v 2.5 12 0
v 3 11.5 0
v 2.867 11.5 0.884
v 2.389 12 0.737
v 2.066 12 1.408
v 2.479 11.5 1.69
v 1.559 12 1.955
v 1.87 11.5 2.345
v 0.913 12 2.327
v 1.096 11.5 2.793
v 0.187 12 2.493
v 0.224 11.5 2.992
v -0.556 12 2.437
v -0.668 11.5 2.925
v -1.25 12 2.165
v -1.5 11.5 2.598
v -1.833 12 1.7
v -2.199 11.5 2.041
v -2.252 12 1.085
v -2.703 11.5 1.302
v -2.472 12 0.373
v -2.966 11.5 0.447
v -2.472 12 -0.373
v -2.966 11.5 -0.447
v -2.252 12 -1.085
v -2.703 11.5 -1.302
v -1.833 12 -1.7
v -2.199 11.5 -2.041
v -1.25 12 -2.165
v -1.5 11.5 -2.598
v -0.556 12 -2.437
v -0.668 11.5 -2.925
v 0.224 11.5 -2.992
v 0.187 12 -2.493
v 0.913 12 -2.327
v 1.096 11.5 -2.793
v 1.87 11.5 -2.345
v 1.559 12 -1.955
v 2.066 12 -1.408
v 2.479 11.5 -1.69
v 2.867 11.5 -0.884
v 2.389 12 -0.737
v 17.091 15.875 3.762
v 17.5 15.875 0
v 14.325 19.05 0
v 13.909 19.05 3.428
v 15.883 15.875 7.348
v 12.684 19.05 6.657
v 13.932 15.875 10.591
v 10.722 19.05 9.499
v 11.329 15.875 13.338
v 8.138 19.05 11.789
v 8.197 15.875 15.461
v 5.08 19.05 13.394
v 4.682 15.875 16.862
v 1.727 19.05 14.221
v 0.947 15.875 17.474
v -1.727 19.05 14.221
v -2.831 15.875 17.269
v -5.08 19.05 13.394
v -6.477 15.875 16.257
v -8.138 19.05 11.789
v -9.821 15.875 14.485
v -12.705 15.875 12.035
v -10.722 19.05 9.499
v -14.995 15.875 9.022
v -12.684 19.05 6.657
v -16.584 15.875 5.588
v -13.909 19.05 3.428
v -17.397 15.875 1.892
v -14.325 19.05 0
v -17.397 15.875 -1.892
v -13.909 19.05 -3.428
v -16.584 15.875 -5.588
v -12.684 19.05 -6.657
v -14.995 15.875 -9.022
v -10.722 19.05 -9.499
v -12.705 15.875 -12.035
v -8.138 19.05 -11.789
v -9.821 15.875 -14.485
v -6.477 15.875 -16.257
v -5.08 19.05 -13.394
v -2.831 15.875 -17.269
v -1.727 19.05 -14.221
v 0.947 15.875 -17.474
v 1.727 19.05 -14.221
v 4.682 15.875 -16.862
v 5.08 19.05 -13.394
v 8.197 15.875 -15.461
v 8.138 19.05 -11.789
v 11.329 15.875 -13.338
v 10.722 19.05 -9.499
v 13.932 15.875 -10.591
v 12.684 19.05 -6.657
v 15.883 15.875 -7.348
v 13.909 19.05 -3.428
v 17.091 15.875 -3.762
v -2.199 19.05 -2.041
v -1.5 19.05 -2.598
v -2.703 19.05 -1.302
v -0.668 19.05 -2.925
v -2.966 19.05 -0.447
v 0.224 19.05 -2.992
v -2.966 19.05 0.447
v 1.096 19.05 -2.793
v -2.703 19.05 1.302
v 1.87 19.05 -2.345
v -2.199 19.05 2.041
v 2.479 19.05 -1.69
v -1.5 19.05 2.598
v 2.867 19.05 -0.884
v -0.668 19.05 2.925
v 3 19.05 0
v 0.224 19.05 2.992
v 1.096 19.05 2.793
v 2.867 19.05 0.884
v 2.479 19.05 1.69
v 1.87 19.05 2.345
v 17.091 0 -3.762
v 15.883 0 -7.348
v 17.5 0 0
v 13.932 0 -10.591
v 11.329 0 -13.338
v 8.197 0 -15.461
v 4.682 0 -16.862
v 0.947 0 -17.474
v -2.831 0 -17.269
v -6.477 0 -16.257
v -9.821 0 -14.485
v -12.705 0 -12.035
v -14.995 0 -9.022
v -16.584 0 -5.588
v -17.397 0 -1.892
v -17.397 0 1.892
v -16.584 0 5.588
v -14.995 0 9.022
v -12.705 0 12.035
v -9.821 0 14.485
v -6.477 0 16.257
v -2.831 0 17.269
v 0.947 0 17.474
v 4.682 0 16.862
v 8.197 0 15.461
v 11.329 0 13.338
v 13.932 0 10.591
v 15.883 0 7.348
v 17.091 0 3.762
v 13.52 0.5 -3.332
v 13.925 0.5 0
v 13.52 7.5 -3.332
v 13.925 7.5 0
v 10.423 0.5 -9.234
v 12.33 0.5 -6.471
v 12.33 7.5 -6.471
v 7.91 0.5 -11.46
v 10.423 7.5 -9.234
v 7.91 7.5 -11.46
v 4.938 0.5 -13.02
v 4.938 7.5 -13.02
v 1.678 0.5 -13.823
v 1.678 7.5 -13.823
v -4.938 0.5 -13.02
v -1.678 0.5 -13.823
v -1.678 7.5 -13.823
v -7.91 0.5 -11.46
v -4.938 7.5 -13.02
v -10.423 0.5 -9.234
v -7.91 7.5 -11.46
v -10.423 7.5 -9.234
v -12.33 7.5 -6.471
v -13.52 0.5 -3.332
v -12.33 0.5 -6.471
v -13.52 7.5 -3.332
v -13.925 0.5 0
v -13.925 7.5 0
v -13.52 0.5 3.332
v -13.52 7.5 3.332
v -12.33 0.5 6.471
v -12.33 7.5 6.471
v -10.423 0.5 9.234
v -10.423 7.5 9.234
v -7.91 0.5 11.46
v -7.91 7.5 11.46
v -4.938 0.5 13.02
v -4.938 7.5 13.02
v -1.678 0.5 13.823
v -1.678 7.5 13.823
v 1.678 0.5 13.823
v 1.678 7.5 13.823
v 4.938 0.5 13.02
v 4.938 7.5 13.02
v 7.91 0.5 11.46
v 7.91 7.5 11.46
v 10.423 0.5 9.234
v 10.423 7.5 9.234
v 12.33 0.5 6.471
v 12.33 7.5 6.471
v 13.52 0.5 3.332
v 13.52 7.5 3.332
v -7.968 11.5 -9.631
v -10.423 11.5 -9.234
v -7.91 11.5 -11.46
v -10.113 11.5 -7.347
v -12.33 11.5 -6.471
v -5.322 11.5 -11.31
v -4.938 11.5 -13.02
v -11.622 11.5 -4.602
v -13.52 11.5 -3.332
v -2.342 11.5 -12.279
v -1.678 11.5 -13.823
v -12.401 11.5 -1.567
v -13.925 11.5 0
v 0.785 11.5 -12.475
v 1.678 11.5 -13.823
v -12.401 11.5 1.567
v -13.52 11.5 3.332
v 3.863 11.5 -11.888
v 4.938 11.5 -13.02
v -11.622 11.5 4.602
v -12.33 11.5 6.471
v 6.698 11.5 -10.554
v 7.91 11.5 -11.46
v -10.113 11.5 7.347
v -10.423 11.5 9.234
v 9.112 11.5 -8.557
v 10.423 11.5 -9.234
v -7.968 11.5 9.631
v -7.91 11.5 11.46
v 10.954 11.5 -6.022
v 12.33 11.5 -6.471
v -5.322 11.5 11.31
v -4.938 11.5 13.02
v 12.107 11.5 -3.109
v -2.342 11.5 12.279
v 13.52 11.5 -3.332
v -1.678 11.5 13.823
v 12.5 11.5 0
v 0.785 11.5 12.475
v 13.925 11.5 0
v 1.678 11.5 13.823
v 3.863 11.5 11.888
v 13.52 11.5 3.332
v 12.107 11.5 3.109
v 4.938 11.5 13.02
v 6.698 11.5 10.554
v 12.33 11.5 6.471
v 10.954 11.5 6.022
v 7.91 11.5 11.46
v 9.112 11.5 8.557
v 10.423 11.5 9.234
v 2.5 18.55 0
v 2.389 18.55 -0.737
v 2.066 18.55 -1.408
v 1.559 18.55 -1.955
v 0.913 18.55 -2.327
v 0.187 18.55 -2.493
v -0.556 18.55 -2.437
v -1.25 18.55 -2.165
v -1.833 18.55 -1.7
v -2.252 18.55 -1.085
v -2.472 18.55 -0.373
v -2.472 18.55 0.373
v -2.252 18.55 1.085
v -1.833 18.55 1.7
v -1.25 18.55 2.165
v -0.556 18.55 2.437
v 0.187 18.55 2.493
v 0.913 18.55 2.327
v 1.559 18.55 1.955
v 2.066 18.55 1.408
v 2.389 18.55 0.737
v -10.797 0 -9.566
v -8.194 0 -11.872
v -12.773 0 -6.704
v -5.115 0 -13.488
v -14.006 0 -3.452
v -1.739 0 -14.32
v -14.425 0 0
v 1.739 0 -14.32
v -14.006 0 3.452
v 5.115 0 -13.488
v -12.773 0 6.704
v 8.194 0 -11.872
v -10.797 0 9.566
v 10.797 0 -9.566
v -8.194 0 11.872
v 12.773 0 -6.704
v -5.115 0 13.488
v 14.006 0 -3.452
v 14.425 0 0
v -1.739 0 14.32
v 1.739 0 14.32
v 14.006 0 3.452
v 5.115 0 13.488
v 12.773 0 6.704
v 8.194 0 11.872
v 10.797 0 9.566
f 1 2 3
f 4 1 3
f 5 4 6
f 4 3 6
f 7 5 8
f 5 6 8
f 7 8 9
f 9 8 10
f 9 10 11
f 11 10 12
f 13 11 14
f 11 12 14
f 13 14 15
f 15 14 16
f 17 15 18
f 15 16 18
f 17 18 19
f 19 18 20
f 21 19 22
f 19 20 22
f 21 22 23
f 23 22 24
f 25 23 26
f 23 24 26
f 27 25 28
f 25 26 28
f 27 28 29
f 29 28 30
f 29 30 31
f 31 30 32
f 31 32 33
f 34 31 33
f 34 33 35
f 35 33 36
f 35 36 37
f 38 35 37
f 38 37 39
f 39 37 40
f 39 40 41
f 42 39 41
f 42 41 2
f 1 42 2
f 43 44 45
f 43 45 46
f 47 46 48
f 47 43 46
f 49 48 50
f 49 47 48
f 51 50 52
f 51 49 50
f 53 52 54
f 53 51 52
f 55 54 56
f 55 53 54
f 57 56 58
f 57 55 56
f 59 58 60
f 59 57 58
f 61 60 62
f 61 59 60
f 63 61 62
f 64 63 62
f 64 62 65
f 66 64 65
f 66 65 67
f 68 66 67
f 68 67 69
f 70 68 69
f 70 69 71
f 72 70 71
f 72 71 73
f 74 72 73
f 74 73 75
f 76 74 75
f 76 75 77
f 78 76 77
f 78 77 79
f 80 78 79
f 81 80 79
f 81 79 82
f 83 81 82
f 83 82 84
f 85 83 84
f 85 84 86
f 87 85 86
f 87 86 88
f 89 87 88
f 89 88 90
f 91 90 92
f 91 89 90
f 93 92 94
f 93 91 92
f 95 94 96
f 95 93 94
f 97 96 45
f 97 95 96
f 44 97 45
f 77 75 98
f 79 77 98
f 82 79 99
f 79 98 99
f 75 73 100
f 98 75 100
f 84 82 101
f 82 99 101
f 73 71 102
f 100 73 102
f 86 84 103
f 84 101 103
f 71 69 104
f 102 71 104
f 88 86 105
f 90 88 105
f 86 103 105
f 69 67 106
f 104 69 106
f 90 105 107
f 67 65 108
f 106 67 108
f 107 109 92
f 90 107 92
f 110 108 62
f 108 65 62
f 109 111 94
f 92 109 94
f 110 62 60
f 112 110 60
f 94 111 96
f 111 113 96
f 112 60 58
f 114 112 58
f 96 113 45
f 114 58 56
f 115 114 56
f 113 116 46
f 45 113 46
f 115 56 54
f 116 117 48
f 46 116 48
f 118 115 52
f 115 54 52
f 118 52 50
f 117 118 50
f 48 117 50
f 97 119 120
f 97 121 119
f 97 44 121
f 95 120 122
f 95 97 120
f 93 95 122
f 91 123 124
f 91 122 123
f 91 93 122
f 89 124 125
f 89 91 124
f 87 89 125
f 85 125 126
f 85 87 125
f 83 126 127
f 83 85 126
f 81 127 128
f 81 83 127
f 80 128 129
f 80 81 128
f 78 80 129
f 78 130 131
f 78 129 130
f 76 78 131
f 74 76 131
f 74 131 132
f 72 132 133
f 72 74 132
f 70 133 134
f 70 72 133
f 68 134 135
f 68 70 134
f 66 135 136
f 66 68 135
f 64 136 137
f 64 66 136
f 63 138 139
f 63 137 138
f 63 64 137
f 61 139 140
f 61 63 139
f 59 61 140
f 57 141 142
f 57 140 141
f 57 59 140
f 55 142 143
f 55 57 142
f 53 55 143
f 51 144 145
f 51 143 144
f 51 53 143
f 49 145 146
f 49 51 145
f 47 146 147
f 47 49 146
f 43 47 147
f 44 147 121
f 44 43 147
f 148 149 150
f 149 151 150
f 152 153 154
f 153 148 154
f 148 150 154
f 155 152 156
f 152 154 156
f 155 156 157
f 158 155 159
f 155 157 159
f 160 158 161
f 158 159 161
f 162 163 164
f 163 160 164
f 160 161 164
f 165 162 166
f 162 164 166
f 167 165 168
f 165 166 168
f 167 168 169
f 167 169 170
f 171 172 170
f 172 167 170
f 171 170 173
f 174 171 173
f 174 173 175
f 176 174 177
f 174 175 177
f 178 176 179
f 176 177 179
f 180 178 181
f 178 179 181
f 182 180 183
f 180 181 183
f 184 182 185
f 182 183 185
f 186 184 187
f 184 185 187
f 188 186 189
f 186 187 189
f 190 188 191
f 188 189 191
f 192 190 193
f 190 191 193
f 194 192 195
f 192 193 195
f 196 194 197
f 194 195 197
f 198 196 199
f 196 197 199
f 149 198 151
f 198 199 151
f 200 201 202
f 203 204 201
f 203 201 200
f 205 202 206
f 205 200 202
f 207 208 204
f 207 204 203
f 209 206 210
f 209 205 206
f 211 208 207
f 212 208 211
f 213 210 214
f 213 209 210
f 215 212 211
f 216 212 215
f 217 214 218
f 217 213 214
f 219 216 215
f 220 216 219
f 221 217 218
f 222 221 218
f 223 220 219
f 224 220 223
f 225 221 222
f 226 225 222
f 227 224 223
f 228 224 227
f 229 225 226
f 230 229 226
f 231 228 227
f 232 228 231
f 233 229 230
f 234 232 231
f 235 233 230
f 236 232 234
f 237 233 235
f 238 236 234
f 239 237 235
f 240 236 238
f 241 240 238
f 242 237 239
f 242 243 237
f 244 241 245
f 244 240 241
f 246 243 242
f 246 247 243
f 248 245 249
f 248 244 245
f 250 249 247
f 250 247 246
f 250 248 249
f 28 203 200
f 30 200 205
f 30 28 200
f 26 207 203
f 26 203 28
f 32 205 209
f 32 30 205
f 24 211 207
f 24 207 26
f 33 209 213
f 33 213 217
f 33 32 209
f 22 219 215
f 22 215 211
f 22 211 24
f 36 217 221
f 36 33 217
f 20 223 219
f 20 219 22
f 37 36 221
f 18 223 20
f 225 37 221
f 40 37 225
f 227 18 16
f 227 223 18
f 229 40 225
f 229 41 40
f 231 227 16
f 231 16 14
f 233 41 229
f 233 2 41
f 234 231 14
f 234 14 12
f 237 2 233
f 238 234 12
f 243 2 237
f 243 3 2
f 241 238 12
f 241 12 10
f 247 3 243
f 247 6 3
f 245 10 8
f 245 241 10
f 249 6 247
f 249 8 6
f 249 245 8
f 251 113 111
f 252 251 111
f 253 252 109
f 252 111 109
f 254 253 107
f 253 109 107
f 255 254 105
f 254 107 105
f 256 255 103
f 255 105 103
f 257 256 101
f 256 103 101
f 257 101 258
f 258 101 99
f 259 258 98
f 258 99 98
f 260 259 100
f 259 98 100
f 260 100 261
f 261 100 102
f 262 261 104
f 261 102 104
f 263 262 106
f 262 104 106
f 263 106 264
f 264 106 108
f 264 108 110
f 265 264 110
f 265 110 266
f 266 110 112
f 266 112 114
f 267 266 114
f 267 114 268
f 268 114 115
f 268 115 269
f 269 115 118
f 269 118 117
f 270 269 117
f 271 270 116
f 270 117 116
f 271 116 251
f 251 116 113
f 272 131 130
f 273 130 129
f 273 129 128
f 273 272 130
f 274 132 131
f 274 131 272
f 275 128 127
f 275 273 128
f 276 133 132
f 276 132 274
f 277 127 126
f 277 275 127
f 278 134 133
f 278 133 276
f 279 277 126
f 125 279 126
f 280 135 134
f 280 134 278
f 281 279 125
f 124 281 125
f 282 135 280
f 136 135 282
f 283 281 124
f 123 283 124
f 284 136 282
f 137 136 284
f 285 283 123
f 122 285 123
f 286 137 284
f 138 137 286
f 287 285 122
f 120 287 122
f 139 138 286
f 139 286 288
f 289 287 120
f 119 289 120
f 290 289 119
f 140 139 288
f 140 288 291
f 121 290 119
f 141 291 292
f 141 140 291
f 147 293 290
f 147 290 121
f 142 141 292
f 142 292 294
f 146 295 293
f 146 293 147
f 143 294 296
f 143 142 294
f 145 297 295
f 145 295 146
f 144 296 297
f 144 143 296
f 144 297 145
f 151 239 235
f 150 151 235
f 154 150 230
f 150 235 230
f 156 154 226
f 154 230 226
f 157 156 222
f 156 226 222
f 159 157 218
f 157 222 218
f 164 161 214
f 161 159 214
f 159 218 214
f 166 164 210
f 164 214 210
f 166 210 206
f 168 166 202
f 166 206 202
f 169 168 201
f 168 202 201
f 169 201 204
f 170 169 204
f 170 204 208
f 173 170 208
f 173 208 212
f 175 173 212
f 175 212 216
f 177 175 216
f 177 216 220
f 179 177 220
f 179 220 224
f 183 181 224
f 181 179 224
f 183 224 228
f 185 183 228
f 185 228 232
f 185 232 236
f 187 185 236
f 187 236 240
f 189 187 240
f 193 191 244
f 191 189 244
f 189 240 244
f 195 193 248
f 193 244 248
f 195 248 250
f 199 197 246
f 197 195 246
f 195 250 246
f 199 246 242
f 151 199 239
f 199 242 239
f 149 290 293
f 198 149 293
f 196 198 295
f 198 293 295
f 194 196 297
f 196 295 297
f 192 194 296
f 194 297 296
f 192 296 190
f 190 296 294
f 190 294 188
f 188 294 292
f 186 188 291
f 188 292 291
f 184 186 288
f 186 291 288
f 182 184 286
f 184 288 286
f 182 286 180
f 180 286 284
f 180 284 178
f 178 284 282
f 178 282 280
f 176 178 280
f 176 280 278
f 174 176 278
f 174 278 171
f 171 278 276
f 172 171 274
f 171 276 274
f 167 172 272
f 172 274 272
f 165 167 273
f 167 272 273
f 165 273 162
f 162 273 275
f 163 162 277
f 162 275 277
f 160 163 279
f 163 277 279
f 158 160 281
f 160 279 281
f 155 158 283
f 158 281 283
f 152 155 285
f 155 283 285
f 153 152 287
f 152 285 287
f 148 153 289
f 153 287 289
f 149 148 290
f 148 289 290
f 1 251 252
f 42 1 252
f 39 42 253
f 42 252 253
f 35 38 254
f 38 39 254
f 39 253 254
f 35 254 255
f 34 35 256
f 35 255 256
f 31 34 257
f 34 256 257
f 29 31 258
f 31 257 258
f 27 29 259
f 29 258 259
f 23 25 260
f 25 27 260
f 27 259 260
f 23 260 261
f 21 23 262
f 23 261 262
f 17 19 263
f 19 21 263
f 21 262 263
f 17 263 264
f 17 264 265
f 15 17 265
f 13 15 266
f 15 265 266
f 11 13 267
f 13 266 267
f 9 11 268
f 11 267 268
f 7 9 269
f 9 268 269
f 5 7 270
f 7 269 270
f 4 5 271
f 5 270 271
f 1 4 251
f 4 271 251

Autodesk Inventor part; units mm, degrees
ref_plane "YZ Plane" through (0, 0, 0) normal (1, 0, 0) x (0, 1, 0)
ref_plane "XZ Plane" through (0, 0, 0) normal (0, 1, 0) x (-1, 0, 0)
ref_plane "XY Plane" through (0, 0, 0) normal (0, 0, 1) x (1, 0, 0)
sketch "Sketch1" plane through (0, 0, 0) normal (0, 0, 1) x (1, 0, 0)
  line L0 (0, 0) -> (13.925, 0)
  line L1 (13.925, 0) -> (13.925, 11.5)
  line L2 (13.925, 11.5) -> (0, 11.5)
  line L3 (0, 11.5) -> (0, 0)
  line L4 (0, 0) -> (2.5, 0)
  line L5 (2.5, 0) -> (2.5, 25.4)
  line L6 (2.5, 25.4) -> (0, 25.4)
  line L7 (0, 25.4) -> (0, 0)
  line L8 (0, 0) -> (17.5, 0)
  line L9 (17.5, 0) -> (17.5, 19.05)
  line L10 (17.5, 19.05) -> (0, 19.05)
  line L11 (0, 19.05) -> (0, 0)
  line L12 (13.925, 11.5) -> (12.5, 11.5)
  line L13 (12.5, 11.5) -> (12.5, 7.5)
  line L14 (12.5, 7.5) -> (13.925, 7.5)
  line L15 (13.925, 7.5) -> (13.925, 11.5)
  point P0 (2.5, 19.05)
  point P1 (2.5, 11.5)
  point P2 (13.925, 0)
  dimension "d0" = 13.925
  dimension "d1" = 11.5
  dimension "d2" = 2.5
  dimension "d3" = 25.4
  dimension "d4" = 17.5
  dimension "d5" = 19.05
  dimension "d6" = 4
  dimension "d7" = 12.5
revolve "Revolution1" add sketch "Sketch1" angle 360 about axis through (0, 19.05, 0) along (0, -1, 0) contours L1 L2 L5 L10 L9 L8
chamfer "Chamfer1" distance 3.175 angle 45 1 edges at (-17.5, 19.05, 0)
chamfer "Chamfer2" distance 0.5 angle 45 3 edges at (-13.925, 0, 0) (-2.5, 11.5, 0) (-2.5, 19.05, 0)
properties part number "Flywheel" material "Brass, Soft Yellow"
